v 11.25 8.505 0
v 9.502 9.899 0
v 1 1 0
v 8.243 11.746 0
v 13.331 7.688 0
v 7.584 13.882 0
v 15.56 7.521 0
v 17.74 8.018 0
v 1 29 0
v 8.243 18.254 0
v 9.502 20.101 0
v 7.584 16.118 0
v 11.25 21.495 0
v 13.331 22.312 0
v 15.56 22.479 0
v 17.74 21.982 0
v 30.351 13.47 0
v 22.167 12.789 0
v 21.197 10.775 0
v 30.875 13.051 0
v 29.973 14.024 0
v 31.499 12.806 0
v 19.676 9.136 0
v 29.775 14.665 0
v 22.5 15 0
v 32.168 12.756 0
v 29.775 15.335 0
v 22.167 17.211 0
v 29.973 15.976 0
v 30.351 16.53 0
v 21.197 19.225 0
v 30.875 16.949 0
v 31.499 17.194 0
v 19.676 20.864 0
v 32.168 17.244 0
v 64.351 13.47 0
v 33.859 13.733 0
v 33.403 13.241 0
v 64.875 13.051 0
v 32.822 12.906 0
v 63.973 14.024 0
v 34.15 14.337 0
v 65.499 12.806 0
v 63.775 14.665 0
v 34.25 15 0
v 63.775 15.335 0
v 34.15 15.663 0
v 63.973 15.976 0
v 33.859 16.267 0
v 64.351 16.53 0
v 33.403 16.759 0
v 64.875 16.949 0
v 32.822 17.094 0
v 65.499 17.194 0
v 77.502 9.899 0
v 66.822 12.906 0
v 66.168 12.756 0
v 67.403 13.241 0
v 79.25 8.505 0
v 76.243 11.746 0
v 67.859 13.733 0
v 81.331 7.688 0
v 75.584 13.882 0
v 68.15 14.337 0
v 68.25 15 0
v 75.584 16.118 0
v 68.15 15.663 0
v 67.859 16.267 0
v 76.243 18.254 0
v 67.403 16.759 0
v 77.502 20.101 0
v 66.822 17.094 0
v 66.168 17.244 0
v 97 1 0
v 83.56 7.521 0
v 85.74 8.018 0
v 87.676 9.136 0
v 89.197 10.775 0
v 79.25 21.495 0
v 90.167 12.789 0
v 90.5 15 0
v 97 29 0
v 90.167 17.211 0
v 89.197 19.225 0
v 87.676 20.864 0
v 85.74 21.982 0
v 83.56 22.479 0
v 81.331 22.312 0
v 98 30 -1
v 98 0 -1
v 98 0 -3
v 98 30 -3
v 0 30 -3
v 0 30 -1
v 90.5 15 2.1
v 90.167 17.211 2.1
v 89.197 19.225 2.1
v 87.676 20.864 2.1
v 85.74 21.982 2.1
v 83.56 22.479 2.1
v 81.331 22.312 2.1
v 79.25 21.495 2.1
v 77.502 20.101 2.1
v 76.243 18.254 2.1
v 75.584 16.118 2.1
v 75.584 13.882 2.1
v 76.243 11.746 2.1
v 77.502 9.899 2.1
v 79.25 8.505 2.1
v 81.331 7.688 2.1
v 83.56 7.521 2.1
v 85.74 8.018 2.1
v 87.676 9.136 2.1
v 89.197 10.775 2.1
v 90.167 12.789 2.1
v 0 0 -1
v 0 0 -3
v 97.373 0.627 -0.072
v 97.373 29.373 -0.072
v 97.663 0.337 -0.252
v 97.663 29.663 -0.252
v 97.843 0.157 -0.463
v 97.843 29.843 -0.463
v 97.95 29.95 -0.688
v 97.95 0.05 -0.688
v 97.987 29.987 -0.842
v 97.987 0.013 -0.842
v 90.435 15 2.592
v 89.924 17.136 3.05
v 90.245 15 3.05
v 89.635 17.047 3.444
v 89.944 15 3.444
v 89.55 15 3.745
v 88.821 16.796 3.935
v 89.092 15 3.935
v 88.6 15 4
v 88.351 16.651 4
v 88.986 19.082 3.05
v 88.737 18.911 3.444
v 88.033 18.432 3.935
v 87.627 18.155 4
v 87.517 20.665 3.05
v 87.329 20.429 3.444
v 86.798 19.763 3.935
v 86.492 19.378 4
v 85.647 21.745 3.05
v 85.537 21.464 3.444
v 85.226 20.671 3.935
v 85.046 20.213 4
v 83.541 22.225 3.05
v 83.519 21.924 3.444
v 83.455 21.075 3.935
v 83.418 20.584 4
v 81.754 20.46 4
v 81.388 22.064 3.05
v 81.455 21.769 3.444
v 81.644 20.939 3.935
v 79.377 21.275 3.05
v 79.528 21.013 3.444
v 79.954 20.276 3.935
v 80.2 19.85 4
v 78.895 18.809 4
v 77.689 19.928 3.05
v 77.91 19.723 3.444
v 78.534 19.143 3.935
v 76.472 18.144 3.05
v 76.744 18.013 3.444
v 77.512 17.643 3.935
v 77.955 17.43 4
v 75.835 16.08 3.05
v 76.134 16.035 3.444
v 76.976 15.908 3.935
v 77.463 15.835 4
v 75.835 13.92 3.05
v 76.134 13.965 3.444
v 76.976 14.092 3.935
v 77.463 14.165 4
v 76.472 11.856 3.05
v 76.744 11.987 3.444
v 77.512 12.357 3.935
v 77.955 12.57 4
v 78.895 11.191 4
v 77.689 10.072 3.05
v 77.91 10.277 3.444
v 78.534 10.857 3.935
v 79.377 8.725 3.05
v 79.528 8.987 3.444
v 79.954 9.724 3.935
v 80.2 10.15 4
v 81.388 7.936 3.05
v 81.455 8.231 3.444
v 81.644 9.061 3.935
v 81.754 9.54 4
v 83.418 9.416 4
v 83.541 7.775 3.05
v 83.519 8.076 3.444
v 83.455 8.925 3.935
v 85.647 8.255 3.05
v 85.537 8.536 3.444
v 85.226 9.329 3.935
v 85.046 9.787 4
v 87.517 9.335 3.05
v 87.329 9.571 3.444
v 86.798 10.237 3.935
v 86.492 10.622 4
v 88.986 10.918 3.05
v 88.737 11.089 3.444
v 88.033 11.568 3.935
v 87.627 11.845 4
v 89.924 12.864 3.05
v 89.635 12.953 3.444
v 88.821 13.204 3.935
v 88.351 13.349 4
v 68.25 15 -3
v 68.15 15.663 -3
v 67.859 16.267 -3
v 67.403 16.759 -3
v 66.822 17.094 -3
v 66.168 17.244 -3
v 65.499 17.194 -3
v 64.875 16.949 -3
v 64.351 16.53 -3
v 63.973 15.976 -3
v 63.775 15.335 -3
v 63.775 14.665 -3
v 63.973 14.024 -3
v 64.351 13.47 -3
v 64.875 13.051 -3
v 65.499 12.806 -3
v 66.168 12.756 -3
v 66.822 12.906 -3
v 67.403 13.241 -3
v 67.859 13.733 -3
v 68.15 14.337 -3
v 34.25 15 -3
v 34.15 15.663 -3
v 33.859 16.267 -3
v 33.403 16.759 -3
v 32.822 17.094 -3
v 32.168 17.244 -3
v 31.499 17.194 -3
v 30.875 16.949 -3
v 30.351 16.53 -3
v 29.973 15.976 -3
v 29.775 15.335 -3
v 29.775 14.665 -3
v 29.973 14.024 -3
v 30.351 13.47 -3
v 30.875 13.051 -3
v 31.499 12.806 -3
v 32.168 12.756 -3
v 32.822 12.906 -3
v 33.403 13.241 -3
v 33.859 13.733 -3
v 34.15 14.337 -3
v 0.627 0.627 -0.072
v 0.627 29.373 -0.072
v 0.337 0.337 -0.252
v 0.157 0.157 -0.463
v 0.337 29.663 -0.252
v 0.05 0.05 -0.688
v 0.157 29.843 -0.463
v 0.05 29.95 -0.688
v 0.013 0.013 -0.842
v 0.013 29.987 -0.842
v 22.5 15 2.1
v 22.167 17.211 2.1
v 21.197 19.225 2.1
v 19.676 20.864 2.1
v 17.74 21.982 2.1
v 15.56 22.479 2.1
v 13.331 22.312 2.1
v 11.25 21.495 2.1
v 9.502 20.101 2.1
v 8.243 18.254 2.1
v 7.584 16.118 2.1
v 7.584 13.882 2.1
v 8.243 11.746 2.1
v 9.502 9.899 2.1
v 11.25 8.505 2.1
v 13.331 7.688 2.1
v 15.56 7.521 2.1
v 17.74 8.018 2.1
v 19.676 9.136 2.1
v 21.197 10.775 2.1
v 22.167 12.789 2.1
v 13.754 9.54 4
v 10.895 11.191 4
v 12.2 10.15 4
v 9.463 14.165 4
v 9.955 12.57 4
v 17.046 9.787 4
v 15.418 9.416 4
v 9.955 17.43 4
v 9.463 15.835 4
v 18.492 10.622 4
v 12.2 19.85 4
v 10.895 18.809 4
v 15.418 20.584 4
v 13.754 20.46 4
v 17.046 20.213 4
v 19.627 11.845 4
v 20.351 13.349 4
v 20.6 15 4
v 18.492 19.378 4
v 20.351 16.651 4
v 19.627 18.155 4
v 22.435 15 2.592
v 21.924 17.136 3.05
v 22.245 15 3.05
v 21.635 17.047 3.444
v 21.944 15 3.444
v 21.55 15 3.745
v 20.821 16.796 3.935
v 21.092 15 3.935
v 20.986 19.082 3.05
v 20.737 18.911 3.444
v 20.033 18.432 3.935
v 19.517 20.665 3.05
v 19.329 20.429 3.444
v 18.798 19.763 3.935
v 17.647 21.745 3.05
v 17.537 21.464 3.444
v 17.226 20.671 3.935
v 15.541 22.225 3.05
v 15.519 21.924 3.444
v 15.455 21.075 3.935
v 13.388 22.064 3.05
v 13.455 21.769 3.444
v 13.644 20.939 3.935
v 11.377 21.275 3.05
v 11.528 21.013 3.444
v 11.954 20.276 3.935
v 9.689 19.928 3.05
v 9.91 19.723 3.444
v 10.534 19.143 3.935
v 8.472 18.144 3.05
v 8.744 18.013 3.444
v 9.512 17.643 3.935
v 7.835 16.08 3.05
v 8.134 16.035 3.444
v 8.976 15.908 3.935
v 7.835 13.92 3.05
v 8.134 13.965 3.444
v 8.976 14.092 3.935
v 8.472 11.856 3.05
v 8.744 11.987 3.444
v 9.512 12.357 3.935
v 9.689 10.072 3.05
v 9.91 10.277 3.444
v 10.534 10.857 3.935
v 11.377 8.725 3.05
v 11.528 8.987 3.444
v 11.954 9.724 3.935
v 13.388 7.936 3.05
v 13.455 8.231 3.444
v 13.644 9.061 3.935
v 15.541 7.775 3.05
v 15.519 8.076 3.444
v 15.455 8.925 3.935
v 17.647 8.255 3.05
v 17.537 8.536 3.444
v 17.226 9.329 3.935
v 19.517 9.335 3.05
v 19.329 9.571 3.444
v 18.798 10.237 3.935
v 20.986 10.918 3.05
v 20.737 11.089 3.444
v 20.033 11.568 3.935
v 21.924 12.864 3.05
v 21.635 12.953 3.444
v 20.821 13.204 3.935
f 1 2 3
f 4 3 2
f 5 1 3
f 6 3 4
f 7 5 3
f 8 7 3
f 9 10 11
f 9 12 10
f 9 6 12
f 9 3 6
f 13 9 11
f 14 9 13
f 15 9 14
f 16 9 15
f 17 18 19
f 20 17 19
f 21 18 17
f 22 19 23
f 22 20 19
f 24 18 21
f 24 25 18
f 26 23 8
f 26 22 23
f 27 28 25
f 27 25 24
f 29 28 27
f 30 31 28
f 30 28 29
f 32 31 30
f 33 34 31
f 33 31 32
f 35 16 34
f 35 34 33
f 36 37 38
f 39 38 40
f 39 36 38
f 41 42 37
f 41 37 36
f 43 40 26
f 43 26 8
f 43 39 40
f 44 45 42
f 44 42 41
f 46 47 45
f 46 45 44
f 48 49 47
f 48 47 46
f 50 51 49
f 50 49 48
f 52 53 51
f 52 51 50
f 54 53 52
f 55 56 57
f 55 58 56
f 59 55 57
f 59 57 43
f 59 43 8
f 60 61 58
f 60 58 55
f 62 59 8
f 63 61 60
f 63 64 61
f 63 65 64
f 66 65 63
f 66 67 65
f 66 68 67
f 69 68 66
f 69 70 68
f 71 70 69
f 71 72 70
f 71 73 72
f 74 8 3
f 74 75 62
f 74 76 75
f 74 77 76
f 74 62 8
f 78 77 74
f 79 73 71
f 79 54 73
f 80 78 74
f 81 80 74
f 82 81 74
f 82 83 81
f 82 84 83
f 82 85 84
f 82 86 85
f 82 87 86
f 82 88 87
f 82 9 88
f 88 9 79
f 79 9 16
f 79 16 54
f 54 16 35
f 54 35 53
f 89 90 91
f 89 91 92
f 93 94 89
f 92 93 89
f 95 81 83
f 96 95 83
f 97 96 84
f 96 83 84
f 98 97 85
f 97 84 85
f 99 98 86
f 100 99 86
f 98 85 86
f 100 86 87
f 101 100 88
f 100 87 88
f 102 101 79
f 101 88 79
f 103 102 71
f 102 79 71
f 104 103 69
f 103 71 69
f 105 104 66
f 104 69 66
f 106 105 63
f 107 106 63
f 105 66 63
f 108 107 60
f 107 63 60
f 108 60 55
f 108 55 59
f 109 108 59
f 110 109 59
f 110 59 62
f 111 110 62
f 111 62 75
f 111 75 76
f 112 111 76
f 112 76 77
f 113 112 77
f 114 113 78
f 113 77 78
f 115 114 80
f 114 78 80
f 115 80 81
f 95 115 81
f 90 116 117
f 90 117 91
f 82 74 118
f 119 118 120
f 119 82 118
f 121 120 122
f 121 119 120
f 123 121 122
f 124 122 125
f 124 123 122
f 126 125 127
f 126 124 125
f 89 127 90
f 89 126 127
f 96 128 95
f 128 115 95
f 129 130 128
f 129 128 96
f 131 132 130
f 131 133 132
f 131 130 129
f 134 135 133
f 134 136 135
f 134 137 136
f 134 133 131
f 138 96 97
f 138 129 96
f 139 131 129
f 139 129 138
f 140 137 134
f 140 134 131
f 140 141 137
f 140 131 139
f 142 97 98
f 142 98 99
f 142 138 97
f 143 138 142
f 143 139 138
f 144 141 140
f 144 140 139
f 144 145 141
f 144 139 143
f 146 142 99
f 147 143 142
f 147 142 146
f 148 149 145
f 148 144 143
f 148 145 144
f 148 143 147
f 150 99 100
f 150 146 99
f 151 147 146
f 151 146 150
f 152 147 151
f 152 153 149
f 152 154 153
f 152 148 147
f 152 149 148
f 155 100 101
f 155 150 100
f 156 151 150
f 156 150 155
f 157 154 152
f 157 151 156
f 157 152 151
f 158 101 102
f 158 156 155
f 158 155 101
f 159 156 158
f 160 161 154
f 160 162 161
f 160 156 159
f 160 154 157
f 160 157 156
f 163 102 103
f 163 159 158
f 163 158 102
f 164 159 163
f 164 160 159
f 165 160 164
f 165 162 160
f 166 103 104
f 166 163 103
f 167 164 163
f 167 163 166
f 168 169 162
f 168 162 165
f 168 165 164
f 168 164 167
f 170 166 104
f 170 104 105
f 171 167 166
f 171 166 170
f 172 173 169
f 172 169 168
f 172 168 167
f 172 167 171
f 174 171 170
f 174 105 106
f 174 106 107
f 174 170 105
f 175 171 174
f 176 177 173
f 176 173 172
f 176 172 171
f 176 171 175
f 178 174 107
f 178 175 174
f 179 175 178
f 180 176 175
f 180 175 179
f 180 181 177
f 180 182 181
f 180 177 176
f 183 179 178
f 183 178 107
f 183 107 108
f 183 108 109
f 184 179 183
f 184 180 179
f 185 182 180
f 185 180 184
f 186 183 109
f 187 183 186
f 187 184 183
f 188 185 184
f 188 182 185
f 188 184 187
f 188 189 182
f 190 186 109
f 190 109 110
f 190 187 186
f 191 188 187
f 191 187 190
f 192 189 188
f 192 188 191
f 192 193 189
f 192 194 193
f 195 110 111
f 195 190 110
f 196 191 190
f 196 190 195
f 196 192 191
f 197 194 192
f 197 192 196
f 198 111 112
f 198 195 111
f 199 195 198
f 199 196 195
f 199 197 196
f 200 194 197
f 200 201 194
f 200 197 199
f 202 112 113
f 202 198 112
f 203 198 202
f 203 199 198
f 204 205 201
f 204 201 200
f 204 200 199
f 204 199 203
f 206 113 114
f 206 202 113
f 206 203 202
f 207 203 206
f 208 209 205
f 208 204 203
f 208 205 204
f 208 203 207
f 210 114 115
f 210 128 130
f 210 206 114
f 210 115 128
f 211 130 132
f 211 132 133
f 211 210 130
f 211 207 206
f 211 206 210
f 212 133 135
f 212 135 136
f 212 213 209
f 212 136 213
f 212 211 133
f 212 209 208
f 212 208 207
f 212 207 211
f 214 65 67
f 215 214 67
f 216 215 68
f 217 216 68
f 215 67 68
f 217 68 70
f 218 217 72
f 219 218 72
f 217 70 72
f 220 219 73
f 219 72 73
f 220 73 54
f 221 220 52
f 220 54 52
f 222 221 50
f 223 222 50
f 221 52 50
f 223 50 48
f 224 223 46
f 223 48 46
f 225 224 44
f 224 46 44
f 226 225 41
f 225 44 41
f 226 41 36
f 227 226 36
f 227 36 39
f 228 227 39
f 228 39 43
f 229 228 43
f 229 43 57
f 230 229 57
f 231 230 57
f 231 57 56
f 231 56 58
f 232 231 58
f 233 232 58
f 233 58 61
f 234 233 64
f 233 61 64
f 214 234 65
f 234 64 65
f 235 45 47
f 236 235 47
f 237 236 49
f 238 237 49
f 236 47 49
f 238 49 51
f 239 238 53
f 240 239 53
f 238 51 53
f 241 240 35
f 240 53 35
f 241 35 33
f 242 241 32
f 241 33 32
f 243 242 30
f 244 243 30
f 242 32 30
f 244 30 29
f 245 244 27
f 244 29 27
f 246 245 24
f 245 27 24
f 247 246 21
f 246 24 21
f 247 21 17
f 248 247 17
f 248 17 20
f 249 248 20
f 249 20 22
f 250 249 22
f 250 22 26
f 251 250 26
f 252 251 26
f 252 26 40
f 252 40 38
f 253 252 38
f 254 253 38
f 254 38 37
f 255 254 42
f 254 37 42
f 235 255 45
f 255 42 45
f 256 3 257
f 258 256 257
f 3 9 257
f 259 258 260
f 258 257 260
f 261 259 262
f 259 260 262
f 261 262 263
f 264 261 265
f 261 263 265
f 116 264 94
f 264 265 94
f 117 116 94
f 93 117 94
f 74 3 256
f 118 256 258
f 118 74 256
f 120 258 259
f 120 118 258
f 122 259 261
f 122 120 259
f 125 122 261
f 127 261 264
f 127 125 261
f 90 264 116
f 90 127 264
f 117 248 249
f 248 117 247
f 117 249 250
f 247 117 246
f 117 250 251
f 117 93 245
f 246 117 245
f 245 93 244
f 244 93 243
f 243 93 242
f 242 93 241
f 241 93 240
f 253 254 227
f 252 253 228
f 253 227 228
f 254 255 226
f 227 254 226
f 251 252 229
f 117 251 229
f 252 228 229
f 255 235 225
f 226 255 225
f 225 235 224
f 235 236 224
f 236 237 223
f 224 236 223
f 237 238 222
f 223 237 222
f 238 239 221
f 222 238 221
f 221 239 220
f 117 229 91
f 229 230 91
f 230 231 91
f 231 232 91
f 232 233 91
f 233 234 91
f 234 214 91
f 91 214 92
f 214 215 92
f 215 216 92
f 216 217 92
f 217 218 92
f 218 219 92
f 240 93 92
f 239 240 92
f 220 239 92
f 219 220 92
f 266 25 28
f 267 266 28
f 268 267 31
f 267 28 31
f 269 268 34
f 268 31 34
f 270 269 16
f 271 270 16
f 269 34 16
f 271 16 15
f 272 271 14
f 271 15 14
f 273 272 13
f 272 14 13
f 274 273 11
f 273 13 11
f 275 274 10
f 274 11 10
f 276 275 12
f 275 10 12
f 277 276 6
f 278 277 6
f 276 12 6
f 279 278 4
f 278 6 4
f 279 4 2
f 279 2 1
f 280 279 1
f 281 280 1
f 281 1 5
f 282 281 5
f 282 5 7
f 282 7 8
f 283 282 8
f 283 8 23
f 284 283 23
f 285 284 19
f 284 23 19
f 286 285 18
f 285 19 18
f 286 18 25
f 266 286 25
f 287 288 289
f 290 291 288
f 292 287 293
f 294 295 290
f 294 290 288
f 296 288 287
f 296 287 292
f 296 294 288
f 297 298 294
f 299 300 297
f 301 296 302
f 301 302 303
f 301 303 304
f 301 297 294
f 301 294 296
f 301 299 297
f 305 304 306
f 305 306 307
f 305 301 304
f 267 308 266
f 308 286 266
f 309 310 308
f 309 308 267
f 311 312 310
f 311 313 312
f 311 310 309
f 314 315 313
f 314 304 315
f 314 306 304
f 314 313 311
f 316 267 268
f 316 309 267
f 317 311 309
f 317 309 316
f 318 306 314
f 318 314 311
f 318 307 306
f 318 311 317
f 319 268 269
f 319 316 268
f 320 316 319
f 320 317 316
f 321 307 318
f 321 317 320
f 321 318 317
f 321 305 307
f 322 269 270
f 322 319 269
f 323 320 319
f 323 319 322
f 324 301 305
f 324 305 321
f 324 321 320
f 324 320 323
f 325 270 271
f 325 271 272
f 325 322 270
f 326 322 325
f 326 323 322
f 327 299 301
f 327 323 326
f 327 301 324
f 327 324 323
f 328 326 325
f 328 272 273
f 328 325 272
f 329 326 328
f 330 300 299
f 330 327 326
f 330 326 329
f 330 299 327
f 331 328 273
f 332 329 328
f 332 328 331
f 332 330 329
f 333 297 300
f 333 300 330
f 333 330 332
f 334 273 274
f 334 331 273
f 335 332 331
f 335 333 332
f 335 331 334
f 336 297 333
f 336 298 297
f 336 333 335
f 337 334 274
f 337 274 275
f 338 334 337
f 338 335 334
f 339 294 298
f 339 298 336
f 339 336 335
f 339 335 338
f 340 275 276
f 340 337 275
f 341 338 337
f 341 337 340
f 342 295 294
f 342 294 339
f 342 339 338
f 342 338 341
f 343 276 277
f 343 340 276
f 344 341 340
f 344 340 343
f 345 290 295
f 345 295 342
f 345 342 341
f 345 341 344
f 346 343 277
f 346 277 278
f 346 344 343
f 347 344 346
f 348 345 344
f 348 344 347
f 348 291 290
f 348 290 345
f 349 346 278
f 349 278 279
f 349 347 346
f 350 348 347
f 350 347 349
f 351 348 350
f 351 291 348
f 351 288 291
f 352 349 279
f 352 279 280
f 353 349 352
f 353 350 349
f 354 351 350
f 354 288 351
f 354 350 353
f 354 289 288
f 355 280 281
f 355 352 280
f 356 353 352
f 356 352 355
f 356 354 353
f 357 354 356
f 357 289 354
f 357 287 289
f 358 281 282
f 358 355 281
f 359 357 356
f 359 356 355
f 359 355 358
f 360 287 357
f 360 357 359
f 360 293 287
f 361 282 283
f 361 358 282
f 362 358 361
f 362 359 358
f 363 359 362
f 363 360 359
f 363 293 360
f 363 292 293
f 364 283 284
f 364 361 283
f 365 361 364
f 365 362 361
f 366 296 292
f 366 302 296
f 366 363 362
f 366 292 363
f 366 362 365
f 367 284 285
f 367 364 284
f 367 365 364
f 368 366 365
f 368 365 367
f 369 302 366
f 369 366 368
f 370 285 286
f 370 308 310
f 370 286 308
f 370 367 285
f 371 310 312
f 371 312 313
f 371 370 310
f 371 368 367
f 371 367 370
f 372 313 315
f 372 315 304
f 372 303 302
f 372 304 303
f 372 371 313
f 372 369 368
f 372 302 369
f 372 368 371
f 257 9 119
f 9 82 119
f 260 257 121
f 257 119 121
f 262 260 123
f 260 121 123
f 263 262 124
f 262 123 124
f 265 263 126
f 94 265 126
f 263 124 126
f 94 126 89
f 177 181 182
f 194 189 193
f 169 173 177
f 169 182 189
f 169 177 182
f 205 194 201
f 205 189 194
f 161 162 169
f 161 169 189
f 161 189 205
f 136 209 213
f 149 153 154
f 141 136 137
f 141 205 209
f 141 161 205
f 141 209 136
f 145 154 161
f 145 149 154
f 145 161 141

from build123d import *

# Parameters (mm, degrees)
F0_W     = 98
F0_H     = 30
F0_R     = 7.5
F0_R_2   = 2.25
F1_DEPTH = 3
F2_DEPTH = 4
F3_R     = 1.9
F4_R     = 1


with BuildPart() as f1:
    # F0 (on Top) → F1 (new body)
    with BuildSketch(Plane.XY):
        with Locations((49, 15)):
            Rectangle(F0_W, F0_H)
        with Locations((15, 15)):
            Circle(F0_R, mode=Mode.SUBTRACT)
        with Locations((32, 15)):
            Circle(F0_R_2, mode=Mode.SUBTRACT)
        with Locations((66, 15)):
            Circle(F0_R_2, mode=Mode.SUBTRACT)
        with Locations((83, 15)):
            Circle(F0_R, mode=Mode.SUBTRACT)
        with Locations((83, 15)):
            Circle(F0_R)
        with Locations((15, 15)):
            Circle(F0_R)
    extrude(amount=-F1_DEPTH)

    # F0 (on Top) → F2 (join)
    with BuildSketch(Plane.XY):
        with Locations((15, 15)):
            Circle(F0_R)
        with Locations((83, 15)):
            Circle(F0_R)
    extrude(amount=F2_DEPTH)

    # F3
    f3_edges = [f1.edges().sort_by_distance(p)[0] for p in [
        (7.5, 15, 4),
        (75.5, 15, 4),
    ]]
    fillet(f3_edges, radius=F3_R)

    # F4
    f4_edges = [f1.edges().sort_by_distance(p)[0] for p in [
        (49, 30, 0),
        (0, 15, 0),
        (98, 15, 0),
        (49, 0, 0),
    ]]
    fillet(f4_edges, radius=F4_R)


solid = f1.part
